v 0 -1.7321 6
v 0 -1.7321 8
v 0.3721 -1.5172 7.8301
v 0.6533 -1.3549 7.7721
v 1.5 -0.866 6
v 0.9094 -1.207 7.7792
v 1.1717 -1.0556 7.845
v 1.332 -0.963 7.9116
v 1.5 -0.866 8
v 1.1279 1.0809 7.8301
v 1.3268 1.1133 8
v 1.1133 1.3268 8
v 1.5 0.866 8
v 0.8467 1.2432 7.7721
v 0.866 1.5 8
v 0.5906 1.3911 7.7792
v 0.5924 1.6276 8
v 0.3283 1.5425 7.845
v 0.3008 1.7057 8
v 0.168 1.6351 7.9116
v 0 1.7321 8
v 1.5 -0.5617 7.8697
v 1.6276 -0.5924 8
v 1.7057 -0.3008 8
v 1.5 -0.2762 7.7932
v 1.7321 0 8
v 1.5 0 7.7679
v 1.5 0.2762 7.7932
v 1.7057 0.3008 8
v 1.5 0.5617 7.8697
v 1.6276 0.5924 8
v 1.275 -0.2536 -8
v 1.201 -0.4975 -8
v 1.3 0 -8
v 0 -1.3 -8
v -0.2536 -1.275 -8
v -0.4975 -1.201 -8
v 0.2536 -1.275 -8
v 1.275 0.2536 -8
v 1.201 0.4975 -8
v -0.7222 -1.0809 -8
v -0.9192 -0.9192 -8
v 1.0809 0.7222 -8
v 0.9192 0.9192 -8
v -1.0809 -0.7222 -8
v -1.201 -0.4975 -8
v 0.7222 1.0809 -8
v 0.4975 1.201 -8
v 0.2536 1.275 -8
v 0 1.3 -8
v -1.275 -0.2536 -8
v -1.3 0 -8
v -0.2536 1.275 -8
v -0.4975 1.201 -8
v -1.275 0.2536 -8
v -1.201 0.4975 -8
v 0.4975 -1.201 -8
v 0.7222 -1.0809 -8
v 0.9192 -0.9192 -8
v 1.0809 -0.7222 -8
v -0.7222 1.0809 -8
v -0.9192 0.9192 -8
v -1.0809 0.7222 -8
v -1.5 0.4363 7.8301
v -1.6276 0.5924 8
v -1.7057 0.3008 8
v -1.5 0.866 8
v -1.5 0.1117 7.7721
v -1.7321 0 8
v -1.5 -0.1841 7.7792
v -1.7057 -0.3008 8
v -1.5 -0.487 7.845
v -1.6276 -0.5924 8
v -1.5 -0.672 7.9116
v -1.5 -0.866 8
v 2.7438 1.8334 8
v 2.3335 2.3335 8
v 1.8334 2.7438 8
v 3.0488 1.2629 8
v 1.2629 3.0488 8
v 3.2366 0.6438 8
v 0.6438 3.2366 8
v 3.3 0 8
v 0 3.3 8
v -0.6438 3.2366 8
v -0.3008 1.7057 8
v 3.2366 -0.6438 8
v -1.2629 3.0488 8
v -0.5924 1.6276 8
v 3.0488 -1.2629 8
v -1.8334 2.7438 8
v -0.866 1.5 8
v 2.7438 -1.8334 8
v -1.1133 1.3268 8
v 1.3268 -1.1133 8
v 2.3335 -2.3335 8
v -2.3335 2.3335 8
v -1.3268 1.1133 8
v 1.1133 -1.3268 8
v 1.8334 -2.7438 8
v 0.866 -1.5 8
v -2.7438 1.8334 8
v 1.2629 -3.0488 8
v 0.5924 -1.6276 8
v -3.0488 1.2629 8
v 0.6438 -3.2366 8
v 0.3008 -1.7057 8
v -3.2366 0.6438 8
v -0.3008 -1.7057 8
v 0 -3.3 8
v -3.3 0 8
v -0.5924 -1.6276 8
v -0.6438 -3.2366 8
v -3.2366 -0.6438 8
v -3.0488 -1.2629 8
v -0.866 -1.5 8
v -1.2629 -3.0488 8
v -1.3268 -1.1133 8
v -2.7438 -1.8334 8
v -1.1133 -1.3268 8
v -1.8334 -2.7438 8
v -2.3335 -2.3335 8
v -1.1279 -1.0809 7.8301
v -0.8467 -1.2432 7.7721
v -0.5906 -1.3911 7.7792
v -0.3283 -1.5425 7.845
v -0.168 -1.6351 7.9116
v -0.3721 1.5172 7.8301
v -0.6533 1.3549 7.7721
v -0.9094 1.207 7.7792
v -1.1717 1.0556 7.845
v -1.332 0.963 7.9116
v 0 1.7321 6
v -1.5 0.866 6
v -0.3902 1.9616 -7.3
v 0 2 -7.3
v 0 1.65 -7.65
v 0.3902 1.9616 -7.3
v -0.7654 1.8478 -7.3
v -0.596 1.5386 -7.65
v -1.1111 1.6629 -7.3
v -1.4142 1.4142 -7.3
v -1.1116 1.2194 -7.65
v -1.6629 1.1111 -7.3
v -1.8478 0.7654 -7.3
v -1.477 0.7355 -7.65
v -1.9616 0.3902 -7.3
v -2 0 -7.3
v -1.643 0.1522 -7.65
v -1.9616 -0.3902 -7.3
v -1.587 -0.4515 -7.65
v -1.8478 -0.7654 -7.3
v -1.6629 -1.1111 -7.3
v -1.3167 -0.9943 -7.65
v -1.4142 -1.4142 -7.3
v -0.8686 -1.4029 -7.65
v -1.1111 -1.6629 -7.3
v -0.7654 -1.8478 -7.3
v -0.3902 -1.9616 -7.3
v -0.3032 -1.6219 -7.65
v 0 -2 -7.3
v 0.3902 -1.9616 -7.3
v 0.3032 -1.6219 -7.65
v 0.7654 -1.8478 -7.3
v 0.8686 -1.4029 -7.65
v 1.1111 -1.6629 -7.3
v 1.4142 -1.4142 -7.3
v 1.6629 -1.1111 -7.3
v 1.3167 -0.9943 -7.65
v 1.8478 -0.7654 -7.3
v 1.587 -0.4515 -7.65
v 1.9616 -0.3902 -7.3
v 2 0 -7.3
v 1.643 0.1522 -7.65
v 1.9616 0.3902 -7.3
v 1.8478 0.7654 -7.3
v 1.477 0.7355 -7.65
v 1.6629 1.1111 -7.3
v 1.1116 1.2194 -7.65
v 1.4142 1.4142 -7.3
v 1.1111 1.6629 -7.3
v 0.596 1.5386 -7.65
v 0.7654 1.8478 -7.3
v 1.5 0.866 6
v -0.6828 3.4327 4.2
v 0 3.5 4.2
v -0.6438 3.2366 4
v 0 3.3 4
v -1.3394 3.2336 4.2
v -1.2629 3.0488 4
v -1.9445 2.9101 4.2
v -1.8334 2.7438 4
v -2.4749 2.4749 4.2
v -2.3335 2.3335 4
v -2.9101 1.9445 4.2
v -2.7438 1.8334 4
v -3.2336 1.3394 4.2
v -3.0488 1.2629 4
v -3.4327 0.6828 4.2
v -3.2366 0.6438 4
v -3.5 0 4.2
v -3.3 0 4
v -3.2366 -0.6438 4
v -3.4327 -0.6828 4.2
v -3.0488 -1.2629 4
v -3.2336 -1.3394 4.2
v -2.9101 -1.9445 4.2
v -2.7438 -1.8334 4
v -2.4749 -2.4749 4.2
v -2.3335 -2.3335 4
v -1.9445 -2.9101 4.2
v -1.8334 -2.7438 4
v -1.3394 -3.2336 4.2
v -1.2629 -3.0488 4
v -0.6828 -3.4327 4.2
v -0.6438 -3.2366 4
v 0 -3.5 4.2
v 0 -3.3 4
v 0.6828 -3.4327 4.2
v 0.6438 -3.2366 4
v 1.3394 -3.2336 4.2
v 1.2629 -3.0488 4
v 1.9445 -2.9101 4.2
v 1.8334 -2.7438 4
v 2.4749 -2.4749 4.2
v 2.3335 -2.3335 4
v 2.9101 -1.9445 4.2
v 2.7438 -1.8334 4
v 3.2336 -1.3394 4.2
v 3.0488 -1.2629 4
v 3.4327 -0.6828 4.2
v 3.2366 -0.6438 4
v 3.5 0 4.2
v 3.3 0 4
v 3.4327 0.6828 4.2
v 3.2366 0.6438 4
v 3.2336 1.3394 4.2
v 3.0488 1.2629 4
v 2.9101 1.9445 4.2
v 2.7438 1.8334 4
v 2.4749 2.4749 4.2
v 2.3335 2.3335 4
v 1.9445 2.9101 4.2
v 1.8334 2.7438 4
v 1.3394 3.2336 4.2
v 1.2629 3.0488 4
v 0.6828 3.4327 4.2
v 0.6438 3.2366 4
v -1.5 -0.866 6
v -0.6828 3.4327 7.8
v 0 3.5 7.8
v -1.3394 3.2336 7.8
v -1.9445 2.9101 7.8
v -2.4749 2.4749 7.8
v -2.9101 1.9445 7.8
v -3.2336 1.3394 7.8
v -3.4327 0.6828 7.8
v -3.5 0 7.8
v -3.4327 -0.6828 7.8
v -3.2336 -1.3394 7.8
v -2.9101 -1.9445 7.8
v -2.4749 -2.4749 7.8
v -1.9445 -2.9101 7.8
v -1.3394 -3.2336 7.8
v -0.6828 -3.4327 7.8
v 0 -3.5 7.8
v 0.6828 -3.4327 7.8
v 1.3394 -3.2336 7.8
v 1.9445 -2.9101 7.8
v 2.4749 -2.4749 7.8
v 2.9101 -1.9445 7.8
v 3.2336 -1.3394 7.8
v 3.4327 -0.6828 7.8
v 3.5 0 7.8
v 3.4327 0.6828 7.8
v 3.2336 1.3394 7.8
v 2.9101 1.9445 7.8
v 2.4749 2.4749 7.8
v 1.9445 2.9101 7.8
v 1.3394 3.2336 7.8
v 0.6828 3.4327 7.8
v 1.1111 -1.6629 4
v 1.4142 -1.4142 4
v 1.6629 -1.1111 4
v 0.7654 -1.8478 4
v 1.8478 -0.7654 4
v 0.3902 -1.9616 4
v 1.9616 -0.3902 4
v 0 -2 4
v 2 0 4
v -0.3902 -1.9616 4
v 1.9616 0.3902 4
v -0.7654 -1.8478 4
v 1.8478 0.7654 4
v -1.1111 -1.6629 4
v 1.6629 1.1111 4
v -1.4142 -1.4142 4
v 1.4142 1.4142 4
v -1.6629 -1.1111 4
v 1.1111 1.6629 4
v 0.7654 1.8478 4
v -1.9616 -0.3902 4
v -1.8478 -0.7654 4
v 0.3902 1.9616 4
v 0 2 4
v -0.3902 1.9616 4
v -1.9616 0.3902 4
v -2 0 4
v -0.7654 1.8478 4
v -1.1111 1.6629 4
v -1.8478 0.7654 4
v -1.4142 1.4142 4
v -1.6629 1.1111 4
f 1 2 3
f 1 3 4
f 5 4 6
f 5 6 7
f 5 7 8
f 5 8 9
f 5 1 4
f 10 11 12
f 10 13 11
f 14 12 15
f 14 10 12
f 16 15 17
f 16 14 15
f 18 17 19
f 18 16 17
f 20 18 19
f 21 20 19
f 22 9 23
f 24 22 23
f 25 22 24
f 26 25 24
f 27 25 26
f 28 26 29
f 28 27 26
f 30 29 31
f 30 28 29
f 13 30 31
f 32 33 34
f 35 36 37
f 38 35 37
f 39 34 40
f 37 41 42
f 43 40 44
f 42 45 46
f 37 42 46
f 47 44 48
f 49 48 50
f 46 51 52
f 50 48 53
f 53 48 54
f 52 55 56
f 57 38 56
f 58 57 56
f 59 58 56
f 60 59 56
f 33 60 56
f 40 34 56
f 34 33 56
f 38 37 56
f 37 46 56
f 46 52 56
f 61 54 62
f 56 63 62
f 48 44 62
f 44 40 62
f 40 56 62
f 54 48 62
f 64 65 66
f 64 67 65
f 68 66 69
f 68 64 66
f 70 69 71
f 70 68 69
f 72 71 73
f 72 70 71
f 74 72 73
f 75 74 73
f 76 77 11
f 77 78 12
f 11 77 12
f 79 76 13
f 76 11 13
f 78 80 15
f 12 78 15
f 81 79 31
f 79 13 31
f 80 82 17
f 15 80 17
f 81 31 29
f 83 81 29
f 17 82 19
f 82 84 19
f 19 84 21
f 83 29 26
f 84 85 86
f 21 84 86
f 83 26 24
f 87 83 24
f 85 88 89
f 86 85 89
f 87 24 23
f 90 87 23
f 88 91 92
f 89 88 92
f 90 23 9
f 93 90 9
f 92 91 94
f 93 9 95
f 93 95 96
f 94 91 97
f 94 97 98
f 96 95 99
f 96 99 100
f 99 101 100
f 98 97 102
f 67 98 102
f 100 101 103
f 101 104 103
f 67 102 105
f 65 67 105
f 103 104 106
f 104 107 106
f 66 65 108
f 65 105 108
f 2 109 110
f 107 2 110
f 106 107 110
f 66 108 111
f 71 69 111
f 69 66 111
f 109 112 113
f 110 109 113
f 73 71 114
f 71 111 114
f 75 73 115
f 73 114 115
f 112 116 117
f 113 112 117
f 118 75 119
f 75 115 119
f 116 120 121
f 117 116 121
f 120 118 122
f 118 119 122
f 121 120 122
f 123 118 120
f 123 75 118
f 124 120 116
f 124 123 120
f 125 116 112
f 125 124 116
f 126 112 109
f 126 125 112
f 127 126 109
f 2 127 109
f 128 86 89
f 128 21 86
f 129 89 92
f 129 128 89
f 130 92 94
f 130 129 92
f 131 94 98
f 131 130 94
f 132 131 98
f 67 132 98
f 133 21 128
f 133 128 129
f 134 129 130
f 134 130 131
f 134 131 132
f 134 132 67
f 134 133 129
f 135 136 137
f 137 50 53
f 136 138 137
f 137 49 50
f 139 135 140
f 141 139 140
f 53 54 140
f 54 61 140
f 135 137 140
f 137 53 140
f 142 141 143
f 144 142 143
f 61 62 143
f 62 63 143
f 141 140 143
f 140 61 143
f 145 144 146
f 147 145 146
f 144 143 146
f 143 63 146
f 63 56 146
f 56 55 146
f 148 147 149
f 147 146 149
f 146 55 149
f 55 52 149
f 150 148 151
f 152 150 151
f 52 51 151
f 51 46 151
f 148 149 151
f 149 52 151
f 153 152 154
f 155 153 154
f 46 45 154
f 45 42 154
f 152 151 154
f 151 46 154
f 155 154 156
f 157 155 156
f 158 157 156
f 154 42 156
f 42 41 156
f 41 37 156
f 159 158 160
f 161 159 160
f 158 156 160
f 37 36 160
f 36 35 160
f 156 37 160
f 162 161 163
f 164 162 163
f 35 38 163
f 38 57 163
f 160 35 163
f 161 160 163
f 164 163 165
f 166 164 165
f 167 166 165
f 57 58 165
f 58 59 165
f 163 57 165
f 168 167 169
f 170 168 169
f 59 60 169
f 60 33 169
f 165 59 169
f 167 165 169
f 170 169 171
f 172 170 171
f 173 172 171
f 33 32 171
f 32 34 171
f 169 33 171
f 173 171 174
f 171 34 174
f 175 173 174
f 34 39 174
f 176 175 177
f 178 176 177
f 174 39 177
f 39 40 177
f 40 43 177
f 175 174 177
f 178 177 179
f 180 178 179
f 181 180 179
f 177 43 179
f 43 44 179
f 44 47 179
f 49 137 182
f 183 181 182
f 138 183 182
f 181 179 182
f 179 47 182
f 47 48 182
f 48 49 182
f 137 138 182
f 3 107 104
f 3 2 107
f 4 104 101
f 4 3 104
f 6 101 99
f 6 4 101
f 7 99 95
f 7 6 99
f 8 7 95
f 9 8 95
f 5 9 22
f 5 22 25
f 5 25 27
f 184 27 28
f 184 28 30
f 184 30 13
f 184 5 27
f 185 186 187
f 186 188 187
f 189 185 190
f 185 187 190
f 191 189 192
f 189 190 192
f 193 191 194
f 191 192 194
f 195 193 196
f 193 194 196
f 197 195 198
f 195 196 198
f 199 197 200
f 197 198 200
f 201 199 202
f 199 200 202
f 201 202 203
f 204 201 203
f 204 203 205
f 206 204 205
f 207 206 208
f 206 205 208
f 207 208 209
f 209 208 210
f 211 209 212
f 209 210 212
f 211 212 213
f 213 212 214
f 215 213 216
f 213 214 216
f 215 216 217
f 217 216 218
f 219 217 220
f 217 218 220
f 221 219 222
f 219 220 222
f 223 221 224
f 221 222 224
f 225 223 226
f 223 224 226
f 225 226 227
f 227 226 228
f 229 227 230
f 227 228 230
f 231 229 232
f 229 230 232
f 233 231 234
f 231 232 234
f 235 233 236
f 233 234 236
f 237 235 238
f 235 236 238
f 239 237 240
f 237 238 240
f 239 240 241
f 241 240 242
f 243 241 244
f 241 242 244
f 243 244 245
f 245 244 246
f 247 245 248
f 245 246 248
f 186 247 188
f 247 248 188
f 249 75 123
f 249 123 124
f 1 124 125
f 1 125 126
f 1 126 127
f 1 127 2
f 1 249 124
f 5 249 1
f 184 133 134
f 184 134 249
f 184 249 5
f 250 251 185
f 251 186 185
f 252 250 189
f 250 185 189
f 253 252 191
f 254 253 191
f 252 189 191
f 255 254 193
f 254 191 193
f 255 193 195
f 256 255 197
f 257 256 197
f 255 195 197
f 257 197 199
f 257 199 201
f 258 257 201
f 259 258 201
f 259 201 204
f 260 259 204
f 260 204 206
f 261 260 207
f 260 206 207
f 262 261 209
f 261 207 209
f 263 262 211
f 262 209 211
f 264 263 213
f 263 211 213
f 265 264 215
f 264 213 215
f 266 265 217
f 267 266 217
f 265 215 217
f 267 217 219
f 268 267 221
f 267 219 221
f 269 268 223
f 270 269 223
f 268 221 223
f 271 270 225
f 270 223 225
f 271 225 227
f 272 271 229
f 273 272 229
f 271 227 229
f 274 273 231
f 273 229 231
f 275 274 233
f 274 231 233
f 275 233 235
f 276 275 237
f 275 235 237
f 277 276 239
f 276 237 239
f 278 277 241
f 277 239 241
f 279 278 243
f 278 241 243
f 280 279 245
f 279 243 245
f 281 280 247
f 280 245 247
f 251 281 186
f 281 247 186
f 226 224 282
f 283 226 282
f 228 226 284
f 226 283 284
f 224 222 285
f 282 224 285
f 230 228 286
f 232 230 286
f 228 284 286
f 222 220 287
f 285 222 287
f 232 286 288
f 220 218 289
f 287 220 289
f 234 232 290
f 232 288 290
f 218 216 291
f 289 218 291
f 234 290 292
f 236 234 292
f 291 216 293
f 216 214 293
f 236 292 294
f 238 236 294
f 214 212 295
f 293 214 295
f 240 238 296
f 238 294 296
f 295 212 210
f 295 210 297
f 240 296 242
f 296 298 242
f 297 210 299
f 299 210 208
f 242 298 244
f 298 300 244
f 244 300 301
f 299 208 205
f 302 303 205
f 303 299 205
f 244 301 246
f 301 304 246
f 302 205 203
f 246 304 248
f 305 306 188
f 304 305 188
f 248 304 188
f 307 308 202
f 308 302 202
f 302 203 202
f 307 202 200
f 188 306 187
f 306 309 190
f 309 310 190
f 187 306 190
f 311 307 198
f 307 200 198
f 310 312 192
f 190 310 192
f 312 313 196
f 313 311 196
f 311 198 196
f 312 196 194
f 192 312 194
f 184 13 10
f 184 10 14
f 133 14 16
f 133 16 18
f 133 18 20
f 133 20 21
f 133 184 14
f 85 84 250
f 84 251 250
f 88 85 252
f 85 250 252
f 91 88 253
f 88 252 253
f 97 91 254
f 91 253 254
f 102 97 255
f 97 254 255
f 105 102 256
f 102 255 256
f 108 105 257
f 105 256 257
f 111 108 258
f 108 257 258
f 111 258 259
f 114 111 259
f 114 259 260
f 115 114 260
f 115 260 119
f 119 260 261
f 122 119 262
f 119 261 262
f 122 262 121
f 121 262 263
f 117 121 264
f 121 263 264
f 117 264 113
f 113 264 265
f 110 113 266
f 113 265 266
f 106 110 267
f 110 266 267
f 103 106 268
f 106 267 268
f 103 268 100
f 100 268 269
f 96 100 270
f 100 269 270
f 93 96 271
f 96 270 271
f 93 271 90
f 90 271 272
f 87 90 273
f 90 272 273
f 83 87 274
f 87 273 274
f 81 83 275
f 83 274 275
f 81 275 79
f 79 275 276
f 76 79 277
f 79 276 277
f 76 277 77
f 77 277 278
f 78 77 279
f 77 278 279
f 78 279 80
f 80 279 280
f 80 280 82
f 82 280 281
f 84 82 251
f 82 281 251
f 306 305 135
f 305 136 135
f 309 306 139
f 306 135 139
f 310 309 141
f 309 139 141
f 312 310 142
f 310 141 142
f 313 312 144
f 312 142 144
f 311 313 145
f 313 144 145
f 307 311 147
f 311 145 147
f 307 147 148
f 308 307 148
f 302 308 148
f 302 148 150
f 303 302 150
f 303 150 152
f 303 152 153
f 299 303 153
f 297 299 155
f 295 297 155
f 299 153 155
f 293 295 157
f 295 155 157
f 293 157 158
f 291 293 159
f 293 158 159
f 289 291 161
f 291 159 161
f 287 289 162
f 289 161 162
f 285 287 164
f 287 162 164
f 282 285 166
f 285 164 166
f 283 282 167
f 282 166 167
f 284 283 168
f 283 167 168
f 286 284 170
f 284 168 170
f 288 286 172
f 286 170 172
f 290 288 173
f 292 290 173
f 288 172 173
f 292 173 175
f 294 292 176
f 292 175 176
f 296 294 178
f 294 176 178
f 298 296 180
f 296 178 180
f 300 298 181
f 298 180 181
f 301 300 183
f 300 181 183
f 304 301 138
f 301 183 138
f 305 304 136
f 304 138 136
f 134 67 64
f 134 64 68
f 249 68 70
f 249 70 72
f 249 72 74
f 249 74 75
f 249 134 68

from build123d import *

# Parameters (mm, degrees)
CUT_EXTRUDE1_START = -2
CUT_EXTRUDE1_DEPTH = 2
SKETCH4_R          = 1.732050808
CUT_EXTRUDE2_DEPTH = 0.5
CUT_EXTRUDE2_TAPER = 45


with BuildPart() as part:
    # Sketch2 → Revolve1 (revolve)
    with BuildSketch(Plane(origin=(0, 0, 0), x_dir=(0, 0, -1), z_dir=(1, 0, 0))):
        Polygon((-7.8, 3.5), (-4.2, 3.5), (-4, 3.3), (-4, 2), (7.3, 2), (8, 1.3), (8, 0), (-8, 0), (-8, 3.3), align=None)
    revolve(axis=Axis((0, 0, -8), (0, 0, 1)))

    # Sketch3 → Cut-Extrude1 (cut)
    with BuildSketch(Plane.XY.offset(8).offset(CUT_EXTRUDE1_START)):
        Polygon((0, 1.732050808), (-1.5, 0.866025404), (-1.5, -0.866025404), (0, -1.732050808), (1.5, -0.866025404), (1.5, 0.866025404), align=None)
    extrude(amount=CUT_EXTRUDE1_DEPTH, mode=Mode.SUBTRACT)

    # Sketch4 → Cut-Extrude2 (cut)
    with BuildSketch(Plane.XY.offset(8)):
        Circle(SKETCH4_R)
    extrude(amount=-CUT_EXTRUDE2_DEPTH, taper=CUT_EXTRUDE2_TAPER, mode=Mode.SUBTRACT)


solid = part.part
